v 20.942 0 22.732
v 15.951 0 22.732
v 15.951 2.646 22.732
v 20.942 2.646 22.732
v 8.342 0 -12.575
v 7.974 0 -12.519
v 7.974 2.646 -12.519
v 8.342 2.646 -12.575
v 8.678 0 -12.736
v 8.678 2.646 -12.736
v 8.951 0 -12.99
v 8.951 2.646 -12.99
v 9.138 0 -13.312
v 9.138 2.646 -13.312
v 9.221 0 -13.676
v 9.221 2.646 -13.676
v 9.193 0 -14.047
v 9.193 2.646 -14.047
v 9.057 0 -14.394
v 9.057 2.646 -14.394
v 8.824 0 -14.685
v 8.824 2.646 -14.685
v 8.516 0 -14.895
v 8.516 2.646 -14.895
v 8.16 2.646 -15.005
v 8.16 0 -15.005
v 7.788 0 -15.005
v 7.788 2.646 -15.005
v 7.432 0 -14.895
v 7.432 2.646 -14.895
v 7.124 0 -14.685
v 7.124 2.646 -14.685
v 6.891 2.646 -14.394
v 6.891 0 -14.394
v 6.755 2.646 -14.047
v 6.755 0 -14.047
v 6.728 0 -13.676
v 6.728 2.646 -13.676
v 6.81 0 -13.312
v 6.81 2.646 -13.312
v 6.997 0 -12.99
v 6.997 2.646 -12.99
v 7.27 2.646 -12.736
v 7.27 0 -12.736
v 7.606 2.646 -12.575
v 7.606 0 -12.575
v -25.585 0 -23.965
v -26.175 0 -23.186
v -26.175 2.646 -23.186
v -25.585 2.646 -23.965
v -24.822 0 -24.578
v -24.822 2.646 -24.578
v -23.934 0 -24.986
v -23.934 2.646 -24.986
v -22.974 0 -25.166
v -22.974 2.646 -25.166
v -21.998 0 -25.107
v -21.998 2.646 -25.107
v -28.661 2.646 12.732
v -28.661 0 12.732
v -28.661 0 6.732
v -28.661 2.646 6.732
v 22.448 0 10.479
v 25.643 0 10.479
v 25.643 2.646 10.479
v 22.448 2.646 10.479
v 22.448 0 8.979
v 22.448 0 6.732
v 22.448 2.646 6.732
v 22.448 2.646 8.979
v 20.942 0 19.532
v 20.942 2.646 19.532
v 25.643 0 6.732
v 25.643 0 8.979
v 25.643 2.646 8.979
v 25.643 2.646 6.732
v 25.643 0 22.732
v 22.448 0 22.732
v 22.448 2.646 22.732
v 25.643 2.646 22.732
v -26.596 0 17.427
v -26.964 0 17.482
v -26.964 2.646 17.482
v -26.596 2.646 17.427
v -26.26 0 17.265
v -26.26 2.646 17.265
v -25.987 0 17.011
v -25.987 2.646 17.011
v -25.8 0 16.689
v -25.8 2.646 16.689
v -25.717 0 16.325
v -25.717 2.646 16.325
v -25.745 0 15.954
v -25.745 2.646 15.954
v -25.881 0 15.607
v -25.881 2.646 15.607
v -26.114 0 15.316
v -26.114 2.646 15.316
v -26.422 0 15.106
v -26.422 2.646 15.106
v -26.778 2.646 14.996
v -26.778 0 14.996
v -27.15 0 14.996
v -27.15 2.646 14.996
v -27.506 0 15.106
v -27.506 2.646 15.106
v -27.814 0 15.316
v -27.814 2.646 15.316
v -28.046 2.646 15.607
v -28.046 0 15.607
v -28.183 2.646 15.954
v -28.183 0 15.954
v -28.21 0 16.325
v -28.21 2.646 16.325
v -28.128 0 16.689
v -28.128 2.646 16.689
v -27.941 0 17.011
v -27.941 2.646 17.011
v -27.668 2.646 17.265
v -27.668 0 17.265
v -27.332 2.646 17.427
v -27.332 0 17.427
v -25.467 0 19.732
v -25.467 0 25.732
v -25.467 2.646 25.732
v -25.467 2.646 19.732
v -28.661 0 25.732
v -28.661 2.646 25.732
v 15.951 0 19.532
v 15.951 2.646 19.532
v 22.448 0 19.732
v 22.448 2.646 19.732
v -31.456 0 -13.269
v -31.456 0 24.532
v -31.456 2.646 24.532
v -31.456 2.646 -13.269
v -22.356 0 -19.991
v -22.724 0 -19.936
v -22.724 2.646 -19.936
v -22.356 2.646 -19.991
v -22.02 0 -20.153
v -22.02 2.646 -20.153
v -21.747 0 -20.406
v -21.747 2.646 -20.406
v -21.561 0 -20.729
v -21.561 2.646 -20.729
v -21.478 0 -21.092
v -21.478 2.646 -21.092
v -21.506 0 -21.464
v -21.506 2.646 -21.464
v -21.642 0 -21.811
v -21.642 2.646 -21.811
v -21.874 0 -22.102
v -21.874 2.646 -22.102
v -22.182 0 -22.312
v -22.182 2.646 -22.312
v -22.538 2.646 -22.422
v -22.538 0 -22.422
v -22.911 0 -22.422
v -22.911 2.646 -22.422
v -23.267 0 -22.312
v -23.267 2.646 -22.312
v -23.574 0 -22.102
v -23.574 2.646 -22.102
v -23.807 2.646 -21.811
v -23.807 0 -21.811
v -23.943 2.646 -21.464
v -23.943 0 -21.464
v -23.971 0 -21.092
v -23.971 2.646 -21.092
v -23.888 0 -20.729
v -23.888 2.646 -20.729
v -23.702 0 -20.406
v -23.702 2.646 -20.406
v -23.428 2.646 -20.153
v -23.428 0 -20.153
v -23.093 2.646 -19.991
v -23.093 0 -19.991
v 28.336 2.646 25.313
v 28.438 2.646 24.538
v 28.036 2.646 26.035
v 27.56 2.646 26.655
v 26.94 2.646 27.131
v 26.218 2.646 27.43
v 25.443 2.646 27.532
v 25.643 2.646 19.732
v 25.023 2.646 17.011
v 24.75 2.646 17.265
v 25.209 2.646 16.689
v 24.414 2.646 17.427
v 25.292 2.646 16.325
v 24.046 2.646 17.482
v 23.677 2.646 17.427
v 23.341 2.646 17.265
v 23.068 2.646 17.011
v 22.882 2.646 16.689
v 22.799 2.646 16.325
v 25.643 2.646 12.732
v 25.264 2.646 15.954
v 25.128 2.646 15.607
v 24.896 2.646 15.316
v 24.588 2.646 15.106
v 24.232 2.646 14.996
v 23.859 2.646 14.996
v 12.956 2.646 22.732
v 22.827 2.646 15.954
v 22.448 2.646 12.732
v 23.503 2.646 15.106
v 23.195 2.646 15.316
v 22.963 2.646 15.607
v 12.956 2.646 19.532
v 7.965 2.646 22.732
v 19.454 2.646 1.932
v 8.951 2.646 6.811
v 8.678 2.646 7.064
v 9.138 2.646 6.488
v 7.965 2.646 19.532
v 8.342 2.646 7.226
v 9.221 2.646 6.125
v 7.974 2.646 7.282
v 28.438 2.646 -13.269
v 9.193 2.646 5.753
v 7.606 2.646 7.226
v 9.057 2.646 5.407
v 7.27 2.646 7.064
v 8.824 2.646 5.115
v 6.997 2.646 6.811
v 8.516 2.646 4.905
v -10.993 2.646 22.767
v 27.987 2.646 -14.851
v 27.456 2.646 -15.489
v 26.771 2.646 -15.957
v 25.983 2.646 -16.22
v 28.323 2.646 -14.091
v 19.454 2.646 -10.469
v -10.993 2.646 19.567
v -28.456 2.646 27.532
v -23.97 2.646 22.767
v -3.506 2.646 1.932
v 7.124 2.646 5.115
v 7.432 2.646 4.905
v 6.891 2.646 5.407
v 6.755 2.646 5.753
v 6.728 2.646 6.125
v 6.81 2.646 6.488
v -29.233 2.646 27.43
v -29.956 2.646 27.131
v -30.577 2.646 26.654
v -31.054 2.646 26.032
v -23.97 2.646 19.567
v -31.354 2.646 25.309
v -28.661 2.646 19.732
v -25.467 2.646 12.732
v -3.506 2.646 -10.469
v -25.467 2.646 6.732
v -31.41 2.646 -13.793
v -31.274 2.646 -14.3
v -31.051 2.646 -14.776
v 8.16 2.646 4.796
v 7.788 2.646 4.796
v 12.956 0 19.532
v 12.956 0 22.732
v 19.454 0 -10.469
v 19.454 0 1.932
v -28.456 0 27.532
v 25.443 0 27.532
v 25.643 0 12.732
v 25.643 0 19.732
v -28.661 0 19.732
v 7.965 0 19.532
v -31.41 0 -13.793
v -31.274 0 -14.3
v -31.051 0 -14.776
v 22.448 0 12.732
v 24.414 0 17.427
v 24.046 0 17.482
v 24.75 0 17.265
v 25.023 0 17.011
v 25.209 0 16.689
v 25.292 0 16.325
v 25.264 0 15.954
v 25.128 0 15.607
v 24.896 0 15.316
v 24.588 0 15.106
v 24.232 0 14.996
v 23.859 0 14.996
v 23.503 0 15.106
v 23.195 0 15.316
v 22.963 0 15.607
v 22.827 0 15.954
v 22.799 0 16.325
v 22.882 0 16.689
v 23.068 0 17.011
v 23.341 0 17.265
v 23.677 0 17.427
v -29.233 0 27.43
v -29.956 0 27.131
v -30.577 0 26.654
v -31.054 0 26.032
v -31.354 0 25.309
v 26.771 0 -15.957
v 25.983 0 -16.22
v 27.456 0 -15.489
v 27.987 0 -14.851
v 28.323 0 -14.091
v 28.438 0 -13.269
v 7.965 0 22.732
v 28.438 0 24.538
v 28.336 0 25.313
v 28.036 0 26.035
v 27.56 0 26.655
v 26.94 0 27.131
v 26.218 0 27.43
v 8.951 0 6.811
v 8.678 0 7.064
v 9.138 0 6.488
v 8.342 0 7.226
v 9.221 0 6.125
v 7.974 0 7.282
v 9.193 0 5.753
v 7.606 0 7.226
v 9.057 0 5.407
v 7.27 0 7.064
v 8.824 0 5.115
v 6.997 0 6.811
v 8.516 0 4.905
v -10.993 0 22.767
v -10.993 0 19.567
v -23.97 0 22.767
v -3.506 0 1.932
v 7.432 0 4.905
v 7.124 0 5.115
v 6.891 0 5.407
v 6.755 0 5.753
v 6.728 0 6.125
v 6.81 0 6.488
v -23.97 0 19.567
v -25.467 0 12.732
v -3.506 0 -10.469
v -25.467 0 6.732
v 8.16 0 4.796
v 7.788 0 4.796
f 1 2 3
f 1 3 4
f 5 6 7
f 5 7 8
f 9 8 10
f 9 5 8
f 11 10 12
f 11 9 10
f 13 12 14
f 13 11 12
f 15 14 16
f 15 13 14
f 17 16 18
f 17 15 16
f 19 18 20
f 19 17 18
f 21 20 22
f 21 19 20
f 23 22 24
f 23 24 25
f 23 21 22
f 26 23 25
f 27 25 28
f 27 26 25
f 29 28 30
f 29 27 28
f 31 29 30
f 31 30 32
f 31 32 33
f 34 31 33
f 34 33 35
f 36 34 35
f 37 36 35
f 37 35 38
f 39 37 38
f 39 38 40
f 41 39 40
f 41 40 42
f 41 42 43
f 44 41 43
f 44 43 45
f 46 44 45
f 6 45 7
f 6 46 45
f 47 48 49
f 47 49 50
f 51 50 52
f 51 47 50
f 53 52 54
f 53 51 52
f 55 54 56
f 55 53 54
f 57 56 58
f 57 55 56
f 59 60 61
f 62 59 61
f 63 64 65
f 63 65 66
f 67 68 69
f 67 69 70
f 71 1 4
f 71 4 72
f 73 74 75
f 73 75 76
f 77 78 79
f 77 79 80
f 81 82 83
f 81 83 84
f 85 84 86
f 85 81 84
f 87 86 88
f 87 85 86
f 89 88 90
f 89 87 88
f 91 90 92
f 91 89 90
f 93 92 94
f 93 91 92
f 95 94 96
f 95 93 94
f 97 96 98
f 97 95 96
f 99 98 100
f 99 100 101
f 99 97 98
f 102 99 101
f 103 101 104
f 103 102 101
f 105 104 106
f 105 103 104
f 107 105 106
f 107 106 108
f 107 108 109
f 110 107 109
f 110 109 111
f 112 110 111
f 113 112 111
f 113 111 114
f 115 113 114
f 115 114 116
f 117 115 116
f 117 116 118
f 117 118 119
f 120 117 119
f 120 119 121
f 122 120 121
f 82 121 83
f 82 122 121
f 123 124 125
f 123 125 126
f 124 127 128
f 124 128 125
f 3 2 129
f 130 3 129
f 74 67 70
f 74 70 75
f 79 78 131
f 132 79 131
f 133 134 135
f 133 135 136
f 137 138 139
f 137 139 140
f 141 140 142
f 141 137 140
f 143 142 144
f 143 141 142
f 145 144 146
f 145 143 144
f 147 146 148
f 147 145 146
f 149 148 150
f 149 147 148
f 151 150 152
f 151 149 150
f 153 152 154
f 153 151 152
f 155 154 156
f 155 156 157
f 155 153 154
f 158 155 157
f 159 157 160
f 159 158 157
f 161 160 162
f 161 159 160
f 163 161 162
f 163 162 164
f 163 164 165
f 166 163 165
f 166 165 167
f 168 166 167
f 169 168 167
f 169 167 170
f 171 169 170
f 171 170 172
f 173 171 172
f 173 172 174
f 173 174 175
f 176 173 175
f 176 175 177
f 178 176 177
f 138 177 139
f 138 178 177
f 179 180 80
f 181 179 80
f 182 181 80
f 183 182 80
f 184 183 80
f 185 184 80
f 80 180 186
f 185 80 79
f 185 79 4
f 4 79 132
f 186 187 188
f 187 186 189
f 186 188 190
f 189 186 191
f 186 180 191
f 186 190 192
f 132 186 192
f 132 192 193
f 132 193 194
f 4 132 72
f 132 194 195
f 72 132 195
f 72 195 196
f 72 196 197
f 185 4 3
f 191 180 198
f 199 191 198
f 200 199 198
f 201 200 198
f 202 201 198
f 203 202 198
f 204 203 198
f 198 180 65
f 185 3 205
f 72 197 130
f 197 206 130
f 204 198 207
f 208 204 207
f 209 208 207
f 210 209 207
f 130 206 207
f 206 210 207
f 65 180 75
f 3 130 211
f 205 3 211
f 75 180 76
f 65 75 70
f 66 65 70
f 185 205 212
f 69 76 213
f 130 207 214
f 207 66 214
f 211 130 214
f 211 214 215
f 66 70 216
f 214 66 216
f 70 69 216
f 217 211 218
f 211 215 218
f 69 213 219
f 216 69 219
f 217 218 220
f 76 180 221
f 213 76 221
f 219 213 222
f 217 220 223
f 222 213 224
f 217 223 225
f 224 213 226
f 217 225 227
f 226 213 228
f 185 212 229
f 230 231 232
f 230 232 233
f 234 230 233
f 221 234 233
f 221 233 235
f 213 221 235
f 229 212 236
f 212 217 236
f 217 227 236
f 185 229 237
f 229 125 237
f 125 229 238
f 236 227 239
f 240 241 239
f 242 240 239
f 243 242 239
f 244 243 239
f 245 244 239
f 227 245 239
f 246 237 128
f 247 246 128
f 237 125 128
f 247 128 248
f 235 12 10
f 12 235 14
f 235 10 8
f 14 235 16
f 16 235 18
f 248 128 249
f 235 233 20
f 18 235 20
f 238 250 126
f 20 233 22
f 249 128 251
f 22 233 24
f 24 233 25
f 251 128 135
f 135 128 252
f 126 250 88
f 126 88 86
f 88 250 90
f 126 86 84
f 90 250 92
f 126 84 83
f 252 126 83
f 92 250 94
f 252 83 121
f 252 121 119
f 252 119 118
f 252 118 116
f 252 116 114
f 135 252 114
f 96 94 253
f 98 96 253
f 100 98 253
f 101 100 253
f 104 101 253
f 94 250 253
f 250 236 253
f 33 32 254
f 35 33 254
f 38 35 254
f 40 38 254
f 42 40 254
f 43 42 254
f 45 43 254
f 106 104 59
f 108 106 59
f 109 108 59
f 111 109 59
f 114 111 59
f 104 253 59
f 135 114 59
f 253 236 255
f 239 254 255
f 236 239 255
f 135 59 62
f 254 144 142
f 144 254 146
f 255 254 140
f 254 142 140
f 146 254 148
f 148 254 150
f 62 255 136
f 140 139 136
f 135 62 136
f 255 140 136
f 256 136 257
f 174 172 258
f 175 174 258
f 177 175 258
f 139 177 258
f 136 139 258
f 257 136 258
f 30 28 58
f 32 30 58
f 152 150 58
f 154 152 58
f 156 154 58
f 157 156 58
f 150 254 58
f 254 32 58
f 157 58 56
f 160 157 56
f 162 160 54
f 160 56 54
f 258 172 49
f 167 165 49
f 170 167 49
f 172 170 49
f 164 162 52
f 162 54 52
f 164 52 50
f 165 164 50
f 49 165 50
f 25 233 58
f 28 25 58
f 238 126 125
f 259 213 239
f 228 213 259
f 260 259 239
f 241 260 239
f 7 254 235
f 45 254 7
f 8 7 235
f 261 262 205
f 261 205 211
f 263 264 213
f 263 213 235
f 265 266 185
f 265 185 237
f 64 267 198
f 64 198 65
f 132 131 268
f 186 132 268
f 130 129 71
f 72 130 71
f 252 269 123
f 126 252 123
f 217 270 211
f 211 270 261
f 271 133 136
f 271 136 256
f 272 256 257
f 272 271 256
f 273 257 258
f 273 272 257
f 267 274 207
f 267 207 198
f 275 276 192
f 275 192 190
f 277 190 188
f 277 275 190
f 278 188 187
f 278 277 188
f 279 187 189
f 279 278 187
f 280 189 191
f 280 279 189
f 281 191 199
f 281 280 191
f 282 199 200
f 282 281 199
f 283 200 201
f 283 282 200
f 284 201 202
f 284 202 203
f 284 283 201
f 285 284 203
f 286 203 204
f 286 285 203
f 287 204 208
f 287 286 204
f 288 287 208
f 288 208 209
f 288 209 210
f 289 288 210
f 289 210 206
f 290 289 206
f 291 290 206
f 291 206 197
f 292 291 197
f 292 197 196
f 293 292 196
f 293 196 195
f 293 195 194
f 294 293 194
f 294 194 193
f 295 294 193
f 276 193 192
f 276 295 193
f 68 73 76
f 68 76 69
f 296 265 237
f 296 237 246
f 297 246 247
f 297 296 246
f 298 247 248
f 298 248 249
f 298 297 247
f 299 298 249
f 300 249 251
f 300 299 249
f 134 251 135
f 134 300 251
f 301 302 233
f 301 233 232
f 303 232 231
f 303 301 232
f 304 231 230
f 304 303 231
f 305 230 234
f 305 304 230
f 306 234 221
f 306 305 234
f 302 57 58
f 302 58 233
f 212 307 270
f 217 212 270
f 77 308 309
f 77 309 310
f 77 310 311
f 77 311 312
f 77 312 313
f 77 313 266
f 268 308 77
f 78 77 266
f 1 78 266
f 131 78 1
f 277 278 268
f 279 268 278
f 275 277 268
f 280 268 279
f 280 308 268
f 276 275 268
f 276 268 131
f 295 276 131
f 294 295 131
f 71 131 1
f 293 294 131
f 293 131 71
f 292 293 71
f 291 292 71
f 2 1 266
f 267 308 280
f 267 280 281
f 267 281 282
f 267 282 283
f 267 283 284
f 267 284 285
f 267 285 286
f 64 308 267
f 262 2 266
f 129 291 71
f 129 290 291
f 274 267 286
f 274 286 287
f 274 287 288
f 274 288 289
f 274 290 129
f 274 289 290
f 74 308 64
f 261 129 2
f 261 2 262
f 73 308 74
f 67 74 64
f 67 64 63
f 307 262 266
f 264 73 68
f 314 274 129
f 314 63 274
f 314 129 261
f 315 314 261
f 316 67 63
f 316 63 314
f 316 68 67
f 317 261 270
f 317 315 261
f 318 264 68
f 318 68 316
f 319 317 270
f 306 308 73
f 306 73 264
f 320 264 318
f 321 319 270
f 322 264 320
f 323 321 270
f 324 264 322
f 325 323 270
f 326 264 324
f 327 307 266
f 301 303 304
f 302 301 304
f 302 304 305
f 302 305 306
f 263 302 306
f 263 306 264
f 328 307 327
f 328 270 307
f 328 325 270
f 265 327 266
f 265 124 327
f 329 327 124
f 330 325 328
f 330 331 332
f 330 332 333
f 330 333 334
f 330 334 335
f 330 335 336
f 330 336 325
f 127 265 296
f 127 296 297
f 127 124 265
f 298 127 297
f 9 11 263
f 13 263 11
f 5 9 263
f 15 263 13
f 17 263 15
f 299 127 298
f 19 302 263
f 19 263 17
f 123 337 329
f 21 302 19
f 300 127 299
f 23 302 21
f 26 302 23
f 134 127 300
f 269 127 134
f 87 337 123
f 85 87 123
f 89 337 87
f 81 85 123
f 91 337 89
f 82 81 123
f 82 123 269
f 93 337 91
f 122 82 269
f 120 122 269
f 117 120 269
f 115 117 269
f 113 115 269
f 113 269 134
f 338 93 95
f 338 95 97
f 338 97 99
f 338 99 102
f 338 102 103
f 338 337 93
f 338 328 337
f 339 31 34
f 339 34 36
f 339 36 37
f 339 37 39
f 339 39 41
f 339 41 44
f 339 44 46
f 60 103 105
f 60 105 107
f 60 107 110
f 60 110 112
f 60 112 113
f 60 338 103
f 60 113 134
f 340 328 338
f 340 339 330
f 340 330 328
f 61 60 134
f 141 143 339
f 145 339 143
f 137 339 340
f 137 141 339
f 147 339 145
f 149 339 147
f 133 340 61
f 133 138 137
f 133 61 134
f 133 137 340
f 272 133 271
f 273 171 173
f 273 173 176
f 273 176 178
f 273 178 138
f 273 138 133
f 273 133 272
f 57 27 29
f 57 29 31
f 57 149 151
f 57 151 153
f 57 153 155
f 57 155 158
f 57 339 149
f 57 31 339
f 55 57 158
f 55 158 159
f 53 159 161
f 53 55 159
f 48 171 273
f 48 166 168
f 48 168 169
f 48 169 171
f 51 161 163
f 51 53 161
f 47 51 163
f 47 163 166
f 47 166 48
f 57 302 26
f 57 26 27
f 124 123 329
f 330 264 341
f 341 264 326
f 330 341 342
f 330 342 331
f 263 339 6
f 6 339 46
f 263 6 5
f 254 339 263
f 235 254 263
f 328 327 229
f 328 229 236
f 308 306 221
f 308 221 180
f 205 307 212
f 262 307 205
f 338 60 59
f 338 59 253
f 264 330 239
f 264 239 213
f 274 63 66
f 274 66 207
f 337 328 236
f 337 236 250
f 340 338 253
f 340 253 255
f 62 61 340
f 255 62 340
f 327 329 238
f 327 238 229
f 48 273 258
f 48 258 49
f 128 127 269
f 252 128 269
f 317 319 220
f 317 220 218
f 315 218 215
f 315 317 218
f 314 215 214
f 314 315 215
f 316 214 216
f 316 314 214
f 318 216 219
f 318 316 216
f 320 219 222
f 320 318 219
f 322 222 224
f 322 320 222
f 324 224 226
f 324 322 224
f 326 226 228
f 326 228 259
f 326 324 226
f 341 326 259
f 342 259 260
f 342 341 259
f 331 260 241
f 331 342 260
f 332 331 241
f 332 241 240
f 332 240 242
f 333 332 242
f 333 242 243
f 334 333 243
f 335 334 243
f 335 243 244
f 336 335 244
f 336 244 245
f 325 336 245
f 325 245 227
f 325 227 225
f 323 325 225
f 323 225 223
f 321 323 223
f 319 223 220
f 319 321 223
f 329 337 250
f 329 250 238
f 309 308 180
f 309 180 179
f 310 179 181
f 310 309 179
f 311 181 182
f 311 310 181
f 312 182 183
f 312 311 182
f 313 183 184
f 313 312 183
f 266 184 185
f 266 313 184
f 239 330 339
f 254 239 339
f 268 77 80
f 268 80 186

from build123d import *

# Parameters (mm, degrees)
SKETCH1_W           = 3.194434014
SKETCH1_H           = 6.000224533
SKETCH1_W_2         = 12.976803263
SKETCH1_H_2         = 3.200223762
SKETCH1_R           = 1.25
SKETCH1_H_3         = 6.000288014
SKETCH1_W_3         = 4.991186163
SKETCH1_H_4         = 3.200091917
SKETCH1_W_4         = 4.990971694
SKETCH1_W_5         = 3.194492506
SKETCH1_H_5         = 3.000146449
SKETCH1_H_6         = 2.247069465
SKETCH1_W_6         = 22.959409558
SKETCH1_H_7         = 12.40053533
BOSS_EXTRUDE1_DEPTH = 2.646066576


with BuildPart() as part:
    # Sketch1 → Boss-Extrude1 (new body)
    with BuildSketch(Plane(origin=(0, 0, 0), x_dir=(1, 0, 0), z_dir=(0, 1, 0))):
        with BuildLine():
            Line((-28.456084878, -27.532431428), (25.442900716, -27.532431428))
            ThreePointArc((25.442900716, -27.532431428), (27.560473935, -26.65530708), (28.437609204, -24.537738386))
            Line((28.437609204, -24.537738386), (28.437804204, 13.268980227))
            ThreePointArc((28.437804204, 13.268980227), (27.743957441, 15.188191581), (25.983223234, 16.219991273))
            Line((25.983223234, 16.219991273), (-21.997773241, 25.107497345))
            ThreePointArc((-21.997773241, 25.107497345), (-24.390968499, 24.809261571), (-26.174789125, 23.186205164))
            Line((-26.174789125, 23.186205164), (-31.050867612, 14.775968165))
            ThreePointArc((-31.050867612, 14.775968165), (-31.352979308, 14.049412081), (-31.456040564, 13.269326446))
            Line((-31.456040564, 13.269326446), (-31.456040564, -24.532475742))
            ThreePointArc((-31.456040564, -24.532475742), (-30.577373887, -26.653764751), (-28.456084878, -27.532431428))
        make_face()
        with Locations((-27.063830276, -22.732321631)):
            Rectangle(SKETCH1_W, SKETCH1_H, mode=Mode.SUBTRACT)
        with Locations((-17.481737065, -21.16687035)):
            Rectangle(SKETCH1_W_2, SKETCH1_H_2, mode=Mode.SUBTRACT)
        with Locations((-26.963965218, -16.232064957)):
            Circle(SKETCH1_R, mode=Mode.SUBTRACT)
        with Locations((-27.063830275, -9.731776544)):
            Rectangle(SKETCH1_W, SKETCH1_H_3, mode=Mode.SUBTRACT)
        with Locations((10.460708795, -21.132309856)):
            Rectangle(SKETCH1_W_3, SKETCH1_H_4, mode=Mode.SUBTRACT)
        with Locations((18.446511119, -21.132309856)):
            Rectangle(SKETCH1_W_4, SKETCH1_H_4, mode=Mode.SUBTRACT)
        with Locations((24.045427435, -21.232282591)):
            Rectangle(SKETCH1_W_5, SKETCH1_H_5, mode=Mode.SUBTRACT)
        with Locations((24.045515173, -16.23206496)):
            Circle(SKETCH1_R, mode=Mode.SUBTRACT)
        with Locations((7.974006472, -6.031549942)):
            Circle(SKETCH1_R, mode=Mode.SUBTRACT)
        Polygon((22.448181182, -10.484914569), (22.448181182, -10.478708085), (25.642673688, -10.478708085), (25.642673688, -12.731920553), (22.448181182, -12.731920553), align=None, mode=Mode.SUBTRACT)
        with Locations((24.045427436, -7.855167272)):
            Rectangle(SKETCH1_W_5, SKETCH1_H_6, mode=Mode.SUBTRACT)
        with Locations((-22.724218332, 21.185636807)):
            Circle(SKETCH1_R, mode=Mode.SUBTRACT)
        with Locations((7.974006472, 4.268713184)):
            Rectangle(SKETCH1_W_6, SKETCH1_H_7, mode=Mode.SUBTRACT)
        with Locations((7.974006473, 13.76898446)):
            Circle(SKETCH1_R, mode=Mode.SUBTRACT)
    extrude(amount=BOSS_EXTRUDE1_DEPTH)


solid = part.part
